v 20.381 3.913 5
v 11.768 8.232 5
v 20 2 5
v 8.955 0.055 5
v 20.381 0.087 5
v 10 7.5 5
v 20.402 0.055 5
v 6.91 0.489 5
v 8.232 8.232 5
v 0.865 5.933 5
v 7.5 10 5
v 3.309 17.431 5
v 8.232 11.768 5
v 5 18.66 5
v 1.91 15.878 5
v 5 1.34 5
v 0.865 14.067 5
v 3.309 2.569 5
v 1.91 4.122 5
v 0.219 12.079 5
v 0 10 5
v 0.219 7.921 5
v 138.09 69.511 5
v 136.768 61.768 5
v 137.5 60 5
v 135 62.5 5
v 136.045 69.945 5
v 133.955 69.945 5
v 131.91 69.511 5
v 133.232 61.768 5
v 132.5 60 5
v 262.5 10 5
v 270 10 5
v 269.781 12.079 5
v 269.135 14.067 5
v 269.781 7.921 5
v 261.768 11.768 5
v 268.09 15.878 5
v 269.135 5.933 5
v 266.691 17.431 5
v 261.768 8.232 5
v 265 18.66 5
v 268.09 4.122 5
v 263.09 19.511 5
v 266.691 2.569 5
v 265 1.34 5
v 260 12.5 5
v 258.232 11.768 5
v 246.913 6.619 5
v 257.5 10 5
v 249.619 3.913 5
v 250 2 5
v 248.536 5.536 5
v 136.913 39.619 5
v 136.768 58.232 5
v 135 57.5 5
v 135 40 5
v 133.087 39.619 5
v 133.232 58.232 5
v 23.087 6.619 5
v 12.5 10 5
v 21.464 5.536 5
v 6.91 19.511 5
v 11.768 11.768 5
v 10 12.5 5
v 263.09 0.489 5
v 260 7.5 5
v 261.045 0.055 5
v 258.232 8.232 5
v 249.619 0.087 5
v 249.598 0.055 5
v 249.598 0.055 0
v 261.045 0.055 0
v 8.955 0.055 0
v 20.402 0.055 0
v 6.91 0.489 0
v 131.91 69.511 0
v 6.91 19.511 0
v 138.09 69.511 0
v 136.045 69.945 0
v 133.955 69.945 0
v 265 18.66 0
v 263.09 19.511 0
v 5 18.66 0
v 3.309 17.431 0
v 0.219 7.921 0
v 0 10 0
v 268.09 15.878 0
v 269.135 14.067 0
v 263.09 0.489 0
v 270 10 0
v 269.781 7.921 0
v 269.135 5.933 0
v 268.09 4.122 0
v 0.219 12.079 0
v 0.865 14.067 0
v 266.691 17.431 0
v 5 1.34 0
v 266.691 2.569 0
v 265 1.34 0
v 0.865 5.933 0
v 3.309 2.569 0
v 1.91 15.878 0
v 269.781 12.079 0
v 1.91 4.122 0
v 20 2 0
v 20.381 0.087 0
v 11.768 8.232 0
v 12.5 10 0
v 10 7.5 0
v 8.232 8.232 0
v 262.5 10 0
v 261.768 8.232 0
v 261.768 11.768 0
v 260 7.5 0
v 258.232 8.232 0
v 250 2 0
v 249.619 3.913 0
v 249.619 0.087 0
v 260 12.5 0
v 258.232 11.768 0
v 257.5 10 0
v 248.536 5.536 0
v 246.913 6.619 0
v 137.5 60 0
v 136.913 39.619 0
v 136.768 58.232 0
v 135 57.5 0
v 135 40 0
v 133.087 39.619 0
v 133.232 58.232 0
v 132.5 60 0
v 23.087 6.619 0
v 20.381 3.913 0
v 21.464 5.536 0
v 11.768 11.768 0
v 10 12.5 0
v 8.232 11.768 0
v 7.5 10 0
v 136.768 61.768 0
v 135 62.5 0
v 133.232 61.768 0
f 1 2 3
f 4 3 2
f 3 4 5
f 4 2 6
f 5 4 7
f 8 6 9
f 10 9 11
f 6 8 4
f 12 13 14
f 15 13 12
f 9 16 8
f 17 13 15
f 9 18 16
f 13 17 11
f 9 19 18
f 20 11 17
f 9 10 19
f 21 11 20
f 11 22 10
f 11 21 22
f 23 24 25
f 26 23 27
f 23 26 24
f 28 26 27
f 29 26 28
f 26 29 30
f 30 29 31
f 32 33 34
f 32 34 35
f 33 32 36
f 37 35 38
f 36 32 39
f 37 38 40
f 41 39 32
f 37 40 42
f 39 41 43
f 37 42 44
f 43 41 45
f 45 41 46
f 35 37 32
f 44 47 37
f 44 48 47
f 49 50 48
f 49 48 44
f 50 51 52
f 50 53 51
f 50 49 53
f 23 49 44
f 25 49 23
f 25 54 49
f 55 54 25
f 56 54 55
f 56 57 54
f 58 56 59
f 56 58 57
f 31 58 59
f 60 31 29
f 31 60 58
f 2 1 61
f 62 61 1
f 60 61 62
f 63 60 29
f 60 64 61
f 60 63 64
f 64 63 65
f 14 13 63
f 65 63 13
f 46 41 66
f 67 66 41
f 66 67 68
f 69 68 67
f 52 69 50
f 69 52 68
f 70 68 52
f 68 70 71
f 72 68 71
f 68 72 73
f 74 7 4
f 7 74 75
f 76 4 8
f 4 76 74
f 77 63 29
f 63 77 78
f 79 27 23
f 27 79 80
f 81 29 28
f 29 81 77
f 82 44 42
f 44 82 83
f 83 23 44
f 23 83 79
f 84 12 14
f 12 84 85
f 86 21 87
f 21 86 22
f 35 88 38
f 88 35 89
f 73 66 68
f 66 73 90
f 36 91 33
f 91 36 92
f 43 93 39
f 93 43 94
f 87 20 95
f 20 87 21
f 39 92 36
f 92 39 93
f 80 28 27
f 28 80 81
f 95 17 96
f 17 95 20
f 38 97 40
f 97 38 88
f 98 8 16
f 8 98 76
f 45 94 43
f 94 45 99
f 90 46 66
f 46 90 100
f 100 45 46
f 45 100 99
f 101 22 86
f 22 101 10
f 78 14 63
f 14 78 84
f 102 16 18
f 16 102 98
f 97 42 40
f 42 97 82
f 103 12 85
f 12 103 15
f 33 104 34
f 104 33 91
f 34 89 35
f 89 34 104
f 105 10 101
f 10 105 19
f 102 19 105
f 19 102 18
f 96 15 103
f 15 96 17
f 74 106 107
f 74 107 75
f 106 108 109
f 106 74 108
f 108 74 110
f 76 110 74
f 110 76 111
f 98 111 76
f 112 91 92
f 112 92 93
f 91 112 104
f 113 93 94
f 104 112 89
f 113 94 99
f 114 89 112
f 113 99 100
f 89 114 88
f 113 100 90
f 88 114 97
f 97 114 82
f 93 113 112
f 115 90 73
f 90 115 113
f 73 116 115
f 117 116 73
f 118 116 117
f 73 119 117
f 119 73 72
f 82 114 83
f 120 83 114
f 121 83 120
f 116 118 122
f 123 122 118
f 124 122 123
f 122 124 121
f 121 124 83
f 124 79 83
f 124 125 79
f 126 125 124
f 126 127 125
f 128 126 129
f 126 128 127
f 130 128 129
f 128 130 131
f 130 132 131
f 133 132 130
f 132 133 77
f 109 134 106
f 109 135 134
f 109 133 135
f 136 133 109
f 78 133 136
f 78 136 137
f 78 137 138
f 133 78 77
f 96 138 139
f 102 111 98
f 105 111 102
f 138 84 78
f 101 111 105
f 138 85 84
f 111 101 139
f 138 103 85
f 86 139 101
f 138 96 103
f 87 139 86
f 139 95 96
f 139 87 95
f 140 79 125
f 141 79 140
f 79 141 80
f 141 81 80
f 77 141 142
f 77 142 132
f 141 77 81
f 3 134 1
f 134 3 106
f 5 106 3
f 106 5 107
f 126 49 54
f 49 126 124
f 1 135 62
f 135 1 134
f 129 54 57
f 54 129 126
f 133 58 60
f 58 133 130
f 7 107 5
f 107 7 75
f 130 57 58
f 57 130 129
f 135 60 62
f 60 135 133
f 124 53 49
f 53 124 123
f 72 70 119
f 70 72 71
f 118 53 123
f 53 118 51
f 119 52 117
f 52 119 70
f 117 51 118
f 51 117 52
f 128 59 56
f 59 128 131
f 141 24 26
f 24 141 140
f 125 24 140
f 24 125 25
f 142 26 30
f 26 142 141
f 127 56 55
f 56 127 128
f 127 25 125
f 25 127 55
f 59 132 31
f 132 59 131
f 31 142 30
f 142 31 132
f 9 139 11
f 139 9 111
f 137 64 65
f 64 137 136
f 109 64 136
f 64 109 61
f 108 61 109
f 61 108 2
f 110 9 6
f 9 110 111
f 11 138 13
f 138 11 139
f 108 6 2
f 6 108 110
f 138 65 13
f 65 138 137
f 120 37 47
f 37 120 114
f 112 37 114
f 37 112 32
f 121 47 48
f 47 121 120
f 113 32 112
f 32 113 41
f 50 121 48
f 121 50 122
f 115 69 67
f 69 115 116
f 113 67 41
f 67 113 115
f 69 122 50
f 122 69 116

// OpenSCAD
$inch = 25.4;
$half = $inch/2;
$quarter = $inch/4;
$eigth = $inch/8;
$sixteenth = $inch/16;
$thirtysecondth = $inch/32;

module arm() {
   translate([10,10,0]) {
      difference () {
	  	   hull() {
		      translate([0,0,0]) {
			      cylinder(r=10, h=5);
		      }
		      translate([250,0,0]) {
			      cylinder(r=10, h=5);
		      }
		      translate([125,50,0]) {
			      cylinder(r=10, h=5);
		      }
		   }
         translate([0,0,-1]) {
		  	   hull() {
			      translate([15,-8, 0]) {
				      cylinder(r=5, h=7);
			      }
			      translate([235,-8,0]) {
				      cylinder(r=5, h=7);
			      }
			      translate([125,25,0]) {
				      cylinder(r=5, h=7);
			      }
			   }
         }
         translate([125,50,-1]) {
            cylinder(r=2.5, h=7);
         }
         translate([0,0,-1]) {
            cylinder(r=2.5, h=7);
         }
         translate([250,0,-1]) {
            cylinder(r=2.5, h=7);
         }
      }
   }

}

$2d = 0;
if ($2d) {
    projection(cut=true) {
       translate([0,0,0]) rotate([0,0,0]) {
          arm();
       }
    }
} else {
   translate([0,0,0]) rotate([0,0,0]) {
      arm();
   }
}
